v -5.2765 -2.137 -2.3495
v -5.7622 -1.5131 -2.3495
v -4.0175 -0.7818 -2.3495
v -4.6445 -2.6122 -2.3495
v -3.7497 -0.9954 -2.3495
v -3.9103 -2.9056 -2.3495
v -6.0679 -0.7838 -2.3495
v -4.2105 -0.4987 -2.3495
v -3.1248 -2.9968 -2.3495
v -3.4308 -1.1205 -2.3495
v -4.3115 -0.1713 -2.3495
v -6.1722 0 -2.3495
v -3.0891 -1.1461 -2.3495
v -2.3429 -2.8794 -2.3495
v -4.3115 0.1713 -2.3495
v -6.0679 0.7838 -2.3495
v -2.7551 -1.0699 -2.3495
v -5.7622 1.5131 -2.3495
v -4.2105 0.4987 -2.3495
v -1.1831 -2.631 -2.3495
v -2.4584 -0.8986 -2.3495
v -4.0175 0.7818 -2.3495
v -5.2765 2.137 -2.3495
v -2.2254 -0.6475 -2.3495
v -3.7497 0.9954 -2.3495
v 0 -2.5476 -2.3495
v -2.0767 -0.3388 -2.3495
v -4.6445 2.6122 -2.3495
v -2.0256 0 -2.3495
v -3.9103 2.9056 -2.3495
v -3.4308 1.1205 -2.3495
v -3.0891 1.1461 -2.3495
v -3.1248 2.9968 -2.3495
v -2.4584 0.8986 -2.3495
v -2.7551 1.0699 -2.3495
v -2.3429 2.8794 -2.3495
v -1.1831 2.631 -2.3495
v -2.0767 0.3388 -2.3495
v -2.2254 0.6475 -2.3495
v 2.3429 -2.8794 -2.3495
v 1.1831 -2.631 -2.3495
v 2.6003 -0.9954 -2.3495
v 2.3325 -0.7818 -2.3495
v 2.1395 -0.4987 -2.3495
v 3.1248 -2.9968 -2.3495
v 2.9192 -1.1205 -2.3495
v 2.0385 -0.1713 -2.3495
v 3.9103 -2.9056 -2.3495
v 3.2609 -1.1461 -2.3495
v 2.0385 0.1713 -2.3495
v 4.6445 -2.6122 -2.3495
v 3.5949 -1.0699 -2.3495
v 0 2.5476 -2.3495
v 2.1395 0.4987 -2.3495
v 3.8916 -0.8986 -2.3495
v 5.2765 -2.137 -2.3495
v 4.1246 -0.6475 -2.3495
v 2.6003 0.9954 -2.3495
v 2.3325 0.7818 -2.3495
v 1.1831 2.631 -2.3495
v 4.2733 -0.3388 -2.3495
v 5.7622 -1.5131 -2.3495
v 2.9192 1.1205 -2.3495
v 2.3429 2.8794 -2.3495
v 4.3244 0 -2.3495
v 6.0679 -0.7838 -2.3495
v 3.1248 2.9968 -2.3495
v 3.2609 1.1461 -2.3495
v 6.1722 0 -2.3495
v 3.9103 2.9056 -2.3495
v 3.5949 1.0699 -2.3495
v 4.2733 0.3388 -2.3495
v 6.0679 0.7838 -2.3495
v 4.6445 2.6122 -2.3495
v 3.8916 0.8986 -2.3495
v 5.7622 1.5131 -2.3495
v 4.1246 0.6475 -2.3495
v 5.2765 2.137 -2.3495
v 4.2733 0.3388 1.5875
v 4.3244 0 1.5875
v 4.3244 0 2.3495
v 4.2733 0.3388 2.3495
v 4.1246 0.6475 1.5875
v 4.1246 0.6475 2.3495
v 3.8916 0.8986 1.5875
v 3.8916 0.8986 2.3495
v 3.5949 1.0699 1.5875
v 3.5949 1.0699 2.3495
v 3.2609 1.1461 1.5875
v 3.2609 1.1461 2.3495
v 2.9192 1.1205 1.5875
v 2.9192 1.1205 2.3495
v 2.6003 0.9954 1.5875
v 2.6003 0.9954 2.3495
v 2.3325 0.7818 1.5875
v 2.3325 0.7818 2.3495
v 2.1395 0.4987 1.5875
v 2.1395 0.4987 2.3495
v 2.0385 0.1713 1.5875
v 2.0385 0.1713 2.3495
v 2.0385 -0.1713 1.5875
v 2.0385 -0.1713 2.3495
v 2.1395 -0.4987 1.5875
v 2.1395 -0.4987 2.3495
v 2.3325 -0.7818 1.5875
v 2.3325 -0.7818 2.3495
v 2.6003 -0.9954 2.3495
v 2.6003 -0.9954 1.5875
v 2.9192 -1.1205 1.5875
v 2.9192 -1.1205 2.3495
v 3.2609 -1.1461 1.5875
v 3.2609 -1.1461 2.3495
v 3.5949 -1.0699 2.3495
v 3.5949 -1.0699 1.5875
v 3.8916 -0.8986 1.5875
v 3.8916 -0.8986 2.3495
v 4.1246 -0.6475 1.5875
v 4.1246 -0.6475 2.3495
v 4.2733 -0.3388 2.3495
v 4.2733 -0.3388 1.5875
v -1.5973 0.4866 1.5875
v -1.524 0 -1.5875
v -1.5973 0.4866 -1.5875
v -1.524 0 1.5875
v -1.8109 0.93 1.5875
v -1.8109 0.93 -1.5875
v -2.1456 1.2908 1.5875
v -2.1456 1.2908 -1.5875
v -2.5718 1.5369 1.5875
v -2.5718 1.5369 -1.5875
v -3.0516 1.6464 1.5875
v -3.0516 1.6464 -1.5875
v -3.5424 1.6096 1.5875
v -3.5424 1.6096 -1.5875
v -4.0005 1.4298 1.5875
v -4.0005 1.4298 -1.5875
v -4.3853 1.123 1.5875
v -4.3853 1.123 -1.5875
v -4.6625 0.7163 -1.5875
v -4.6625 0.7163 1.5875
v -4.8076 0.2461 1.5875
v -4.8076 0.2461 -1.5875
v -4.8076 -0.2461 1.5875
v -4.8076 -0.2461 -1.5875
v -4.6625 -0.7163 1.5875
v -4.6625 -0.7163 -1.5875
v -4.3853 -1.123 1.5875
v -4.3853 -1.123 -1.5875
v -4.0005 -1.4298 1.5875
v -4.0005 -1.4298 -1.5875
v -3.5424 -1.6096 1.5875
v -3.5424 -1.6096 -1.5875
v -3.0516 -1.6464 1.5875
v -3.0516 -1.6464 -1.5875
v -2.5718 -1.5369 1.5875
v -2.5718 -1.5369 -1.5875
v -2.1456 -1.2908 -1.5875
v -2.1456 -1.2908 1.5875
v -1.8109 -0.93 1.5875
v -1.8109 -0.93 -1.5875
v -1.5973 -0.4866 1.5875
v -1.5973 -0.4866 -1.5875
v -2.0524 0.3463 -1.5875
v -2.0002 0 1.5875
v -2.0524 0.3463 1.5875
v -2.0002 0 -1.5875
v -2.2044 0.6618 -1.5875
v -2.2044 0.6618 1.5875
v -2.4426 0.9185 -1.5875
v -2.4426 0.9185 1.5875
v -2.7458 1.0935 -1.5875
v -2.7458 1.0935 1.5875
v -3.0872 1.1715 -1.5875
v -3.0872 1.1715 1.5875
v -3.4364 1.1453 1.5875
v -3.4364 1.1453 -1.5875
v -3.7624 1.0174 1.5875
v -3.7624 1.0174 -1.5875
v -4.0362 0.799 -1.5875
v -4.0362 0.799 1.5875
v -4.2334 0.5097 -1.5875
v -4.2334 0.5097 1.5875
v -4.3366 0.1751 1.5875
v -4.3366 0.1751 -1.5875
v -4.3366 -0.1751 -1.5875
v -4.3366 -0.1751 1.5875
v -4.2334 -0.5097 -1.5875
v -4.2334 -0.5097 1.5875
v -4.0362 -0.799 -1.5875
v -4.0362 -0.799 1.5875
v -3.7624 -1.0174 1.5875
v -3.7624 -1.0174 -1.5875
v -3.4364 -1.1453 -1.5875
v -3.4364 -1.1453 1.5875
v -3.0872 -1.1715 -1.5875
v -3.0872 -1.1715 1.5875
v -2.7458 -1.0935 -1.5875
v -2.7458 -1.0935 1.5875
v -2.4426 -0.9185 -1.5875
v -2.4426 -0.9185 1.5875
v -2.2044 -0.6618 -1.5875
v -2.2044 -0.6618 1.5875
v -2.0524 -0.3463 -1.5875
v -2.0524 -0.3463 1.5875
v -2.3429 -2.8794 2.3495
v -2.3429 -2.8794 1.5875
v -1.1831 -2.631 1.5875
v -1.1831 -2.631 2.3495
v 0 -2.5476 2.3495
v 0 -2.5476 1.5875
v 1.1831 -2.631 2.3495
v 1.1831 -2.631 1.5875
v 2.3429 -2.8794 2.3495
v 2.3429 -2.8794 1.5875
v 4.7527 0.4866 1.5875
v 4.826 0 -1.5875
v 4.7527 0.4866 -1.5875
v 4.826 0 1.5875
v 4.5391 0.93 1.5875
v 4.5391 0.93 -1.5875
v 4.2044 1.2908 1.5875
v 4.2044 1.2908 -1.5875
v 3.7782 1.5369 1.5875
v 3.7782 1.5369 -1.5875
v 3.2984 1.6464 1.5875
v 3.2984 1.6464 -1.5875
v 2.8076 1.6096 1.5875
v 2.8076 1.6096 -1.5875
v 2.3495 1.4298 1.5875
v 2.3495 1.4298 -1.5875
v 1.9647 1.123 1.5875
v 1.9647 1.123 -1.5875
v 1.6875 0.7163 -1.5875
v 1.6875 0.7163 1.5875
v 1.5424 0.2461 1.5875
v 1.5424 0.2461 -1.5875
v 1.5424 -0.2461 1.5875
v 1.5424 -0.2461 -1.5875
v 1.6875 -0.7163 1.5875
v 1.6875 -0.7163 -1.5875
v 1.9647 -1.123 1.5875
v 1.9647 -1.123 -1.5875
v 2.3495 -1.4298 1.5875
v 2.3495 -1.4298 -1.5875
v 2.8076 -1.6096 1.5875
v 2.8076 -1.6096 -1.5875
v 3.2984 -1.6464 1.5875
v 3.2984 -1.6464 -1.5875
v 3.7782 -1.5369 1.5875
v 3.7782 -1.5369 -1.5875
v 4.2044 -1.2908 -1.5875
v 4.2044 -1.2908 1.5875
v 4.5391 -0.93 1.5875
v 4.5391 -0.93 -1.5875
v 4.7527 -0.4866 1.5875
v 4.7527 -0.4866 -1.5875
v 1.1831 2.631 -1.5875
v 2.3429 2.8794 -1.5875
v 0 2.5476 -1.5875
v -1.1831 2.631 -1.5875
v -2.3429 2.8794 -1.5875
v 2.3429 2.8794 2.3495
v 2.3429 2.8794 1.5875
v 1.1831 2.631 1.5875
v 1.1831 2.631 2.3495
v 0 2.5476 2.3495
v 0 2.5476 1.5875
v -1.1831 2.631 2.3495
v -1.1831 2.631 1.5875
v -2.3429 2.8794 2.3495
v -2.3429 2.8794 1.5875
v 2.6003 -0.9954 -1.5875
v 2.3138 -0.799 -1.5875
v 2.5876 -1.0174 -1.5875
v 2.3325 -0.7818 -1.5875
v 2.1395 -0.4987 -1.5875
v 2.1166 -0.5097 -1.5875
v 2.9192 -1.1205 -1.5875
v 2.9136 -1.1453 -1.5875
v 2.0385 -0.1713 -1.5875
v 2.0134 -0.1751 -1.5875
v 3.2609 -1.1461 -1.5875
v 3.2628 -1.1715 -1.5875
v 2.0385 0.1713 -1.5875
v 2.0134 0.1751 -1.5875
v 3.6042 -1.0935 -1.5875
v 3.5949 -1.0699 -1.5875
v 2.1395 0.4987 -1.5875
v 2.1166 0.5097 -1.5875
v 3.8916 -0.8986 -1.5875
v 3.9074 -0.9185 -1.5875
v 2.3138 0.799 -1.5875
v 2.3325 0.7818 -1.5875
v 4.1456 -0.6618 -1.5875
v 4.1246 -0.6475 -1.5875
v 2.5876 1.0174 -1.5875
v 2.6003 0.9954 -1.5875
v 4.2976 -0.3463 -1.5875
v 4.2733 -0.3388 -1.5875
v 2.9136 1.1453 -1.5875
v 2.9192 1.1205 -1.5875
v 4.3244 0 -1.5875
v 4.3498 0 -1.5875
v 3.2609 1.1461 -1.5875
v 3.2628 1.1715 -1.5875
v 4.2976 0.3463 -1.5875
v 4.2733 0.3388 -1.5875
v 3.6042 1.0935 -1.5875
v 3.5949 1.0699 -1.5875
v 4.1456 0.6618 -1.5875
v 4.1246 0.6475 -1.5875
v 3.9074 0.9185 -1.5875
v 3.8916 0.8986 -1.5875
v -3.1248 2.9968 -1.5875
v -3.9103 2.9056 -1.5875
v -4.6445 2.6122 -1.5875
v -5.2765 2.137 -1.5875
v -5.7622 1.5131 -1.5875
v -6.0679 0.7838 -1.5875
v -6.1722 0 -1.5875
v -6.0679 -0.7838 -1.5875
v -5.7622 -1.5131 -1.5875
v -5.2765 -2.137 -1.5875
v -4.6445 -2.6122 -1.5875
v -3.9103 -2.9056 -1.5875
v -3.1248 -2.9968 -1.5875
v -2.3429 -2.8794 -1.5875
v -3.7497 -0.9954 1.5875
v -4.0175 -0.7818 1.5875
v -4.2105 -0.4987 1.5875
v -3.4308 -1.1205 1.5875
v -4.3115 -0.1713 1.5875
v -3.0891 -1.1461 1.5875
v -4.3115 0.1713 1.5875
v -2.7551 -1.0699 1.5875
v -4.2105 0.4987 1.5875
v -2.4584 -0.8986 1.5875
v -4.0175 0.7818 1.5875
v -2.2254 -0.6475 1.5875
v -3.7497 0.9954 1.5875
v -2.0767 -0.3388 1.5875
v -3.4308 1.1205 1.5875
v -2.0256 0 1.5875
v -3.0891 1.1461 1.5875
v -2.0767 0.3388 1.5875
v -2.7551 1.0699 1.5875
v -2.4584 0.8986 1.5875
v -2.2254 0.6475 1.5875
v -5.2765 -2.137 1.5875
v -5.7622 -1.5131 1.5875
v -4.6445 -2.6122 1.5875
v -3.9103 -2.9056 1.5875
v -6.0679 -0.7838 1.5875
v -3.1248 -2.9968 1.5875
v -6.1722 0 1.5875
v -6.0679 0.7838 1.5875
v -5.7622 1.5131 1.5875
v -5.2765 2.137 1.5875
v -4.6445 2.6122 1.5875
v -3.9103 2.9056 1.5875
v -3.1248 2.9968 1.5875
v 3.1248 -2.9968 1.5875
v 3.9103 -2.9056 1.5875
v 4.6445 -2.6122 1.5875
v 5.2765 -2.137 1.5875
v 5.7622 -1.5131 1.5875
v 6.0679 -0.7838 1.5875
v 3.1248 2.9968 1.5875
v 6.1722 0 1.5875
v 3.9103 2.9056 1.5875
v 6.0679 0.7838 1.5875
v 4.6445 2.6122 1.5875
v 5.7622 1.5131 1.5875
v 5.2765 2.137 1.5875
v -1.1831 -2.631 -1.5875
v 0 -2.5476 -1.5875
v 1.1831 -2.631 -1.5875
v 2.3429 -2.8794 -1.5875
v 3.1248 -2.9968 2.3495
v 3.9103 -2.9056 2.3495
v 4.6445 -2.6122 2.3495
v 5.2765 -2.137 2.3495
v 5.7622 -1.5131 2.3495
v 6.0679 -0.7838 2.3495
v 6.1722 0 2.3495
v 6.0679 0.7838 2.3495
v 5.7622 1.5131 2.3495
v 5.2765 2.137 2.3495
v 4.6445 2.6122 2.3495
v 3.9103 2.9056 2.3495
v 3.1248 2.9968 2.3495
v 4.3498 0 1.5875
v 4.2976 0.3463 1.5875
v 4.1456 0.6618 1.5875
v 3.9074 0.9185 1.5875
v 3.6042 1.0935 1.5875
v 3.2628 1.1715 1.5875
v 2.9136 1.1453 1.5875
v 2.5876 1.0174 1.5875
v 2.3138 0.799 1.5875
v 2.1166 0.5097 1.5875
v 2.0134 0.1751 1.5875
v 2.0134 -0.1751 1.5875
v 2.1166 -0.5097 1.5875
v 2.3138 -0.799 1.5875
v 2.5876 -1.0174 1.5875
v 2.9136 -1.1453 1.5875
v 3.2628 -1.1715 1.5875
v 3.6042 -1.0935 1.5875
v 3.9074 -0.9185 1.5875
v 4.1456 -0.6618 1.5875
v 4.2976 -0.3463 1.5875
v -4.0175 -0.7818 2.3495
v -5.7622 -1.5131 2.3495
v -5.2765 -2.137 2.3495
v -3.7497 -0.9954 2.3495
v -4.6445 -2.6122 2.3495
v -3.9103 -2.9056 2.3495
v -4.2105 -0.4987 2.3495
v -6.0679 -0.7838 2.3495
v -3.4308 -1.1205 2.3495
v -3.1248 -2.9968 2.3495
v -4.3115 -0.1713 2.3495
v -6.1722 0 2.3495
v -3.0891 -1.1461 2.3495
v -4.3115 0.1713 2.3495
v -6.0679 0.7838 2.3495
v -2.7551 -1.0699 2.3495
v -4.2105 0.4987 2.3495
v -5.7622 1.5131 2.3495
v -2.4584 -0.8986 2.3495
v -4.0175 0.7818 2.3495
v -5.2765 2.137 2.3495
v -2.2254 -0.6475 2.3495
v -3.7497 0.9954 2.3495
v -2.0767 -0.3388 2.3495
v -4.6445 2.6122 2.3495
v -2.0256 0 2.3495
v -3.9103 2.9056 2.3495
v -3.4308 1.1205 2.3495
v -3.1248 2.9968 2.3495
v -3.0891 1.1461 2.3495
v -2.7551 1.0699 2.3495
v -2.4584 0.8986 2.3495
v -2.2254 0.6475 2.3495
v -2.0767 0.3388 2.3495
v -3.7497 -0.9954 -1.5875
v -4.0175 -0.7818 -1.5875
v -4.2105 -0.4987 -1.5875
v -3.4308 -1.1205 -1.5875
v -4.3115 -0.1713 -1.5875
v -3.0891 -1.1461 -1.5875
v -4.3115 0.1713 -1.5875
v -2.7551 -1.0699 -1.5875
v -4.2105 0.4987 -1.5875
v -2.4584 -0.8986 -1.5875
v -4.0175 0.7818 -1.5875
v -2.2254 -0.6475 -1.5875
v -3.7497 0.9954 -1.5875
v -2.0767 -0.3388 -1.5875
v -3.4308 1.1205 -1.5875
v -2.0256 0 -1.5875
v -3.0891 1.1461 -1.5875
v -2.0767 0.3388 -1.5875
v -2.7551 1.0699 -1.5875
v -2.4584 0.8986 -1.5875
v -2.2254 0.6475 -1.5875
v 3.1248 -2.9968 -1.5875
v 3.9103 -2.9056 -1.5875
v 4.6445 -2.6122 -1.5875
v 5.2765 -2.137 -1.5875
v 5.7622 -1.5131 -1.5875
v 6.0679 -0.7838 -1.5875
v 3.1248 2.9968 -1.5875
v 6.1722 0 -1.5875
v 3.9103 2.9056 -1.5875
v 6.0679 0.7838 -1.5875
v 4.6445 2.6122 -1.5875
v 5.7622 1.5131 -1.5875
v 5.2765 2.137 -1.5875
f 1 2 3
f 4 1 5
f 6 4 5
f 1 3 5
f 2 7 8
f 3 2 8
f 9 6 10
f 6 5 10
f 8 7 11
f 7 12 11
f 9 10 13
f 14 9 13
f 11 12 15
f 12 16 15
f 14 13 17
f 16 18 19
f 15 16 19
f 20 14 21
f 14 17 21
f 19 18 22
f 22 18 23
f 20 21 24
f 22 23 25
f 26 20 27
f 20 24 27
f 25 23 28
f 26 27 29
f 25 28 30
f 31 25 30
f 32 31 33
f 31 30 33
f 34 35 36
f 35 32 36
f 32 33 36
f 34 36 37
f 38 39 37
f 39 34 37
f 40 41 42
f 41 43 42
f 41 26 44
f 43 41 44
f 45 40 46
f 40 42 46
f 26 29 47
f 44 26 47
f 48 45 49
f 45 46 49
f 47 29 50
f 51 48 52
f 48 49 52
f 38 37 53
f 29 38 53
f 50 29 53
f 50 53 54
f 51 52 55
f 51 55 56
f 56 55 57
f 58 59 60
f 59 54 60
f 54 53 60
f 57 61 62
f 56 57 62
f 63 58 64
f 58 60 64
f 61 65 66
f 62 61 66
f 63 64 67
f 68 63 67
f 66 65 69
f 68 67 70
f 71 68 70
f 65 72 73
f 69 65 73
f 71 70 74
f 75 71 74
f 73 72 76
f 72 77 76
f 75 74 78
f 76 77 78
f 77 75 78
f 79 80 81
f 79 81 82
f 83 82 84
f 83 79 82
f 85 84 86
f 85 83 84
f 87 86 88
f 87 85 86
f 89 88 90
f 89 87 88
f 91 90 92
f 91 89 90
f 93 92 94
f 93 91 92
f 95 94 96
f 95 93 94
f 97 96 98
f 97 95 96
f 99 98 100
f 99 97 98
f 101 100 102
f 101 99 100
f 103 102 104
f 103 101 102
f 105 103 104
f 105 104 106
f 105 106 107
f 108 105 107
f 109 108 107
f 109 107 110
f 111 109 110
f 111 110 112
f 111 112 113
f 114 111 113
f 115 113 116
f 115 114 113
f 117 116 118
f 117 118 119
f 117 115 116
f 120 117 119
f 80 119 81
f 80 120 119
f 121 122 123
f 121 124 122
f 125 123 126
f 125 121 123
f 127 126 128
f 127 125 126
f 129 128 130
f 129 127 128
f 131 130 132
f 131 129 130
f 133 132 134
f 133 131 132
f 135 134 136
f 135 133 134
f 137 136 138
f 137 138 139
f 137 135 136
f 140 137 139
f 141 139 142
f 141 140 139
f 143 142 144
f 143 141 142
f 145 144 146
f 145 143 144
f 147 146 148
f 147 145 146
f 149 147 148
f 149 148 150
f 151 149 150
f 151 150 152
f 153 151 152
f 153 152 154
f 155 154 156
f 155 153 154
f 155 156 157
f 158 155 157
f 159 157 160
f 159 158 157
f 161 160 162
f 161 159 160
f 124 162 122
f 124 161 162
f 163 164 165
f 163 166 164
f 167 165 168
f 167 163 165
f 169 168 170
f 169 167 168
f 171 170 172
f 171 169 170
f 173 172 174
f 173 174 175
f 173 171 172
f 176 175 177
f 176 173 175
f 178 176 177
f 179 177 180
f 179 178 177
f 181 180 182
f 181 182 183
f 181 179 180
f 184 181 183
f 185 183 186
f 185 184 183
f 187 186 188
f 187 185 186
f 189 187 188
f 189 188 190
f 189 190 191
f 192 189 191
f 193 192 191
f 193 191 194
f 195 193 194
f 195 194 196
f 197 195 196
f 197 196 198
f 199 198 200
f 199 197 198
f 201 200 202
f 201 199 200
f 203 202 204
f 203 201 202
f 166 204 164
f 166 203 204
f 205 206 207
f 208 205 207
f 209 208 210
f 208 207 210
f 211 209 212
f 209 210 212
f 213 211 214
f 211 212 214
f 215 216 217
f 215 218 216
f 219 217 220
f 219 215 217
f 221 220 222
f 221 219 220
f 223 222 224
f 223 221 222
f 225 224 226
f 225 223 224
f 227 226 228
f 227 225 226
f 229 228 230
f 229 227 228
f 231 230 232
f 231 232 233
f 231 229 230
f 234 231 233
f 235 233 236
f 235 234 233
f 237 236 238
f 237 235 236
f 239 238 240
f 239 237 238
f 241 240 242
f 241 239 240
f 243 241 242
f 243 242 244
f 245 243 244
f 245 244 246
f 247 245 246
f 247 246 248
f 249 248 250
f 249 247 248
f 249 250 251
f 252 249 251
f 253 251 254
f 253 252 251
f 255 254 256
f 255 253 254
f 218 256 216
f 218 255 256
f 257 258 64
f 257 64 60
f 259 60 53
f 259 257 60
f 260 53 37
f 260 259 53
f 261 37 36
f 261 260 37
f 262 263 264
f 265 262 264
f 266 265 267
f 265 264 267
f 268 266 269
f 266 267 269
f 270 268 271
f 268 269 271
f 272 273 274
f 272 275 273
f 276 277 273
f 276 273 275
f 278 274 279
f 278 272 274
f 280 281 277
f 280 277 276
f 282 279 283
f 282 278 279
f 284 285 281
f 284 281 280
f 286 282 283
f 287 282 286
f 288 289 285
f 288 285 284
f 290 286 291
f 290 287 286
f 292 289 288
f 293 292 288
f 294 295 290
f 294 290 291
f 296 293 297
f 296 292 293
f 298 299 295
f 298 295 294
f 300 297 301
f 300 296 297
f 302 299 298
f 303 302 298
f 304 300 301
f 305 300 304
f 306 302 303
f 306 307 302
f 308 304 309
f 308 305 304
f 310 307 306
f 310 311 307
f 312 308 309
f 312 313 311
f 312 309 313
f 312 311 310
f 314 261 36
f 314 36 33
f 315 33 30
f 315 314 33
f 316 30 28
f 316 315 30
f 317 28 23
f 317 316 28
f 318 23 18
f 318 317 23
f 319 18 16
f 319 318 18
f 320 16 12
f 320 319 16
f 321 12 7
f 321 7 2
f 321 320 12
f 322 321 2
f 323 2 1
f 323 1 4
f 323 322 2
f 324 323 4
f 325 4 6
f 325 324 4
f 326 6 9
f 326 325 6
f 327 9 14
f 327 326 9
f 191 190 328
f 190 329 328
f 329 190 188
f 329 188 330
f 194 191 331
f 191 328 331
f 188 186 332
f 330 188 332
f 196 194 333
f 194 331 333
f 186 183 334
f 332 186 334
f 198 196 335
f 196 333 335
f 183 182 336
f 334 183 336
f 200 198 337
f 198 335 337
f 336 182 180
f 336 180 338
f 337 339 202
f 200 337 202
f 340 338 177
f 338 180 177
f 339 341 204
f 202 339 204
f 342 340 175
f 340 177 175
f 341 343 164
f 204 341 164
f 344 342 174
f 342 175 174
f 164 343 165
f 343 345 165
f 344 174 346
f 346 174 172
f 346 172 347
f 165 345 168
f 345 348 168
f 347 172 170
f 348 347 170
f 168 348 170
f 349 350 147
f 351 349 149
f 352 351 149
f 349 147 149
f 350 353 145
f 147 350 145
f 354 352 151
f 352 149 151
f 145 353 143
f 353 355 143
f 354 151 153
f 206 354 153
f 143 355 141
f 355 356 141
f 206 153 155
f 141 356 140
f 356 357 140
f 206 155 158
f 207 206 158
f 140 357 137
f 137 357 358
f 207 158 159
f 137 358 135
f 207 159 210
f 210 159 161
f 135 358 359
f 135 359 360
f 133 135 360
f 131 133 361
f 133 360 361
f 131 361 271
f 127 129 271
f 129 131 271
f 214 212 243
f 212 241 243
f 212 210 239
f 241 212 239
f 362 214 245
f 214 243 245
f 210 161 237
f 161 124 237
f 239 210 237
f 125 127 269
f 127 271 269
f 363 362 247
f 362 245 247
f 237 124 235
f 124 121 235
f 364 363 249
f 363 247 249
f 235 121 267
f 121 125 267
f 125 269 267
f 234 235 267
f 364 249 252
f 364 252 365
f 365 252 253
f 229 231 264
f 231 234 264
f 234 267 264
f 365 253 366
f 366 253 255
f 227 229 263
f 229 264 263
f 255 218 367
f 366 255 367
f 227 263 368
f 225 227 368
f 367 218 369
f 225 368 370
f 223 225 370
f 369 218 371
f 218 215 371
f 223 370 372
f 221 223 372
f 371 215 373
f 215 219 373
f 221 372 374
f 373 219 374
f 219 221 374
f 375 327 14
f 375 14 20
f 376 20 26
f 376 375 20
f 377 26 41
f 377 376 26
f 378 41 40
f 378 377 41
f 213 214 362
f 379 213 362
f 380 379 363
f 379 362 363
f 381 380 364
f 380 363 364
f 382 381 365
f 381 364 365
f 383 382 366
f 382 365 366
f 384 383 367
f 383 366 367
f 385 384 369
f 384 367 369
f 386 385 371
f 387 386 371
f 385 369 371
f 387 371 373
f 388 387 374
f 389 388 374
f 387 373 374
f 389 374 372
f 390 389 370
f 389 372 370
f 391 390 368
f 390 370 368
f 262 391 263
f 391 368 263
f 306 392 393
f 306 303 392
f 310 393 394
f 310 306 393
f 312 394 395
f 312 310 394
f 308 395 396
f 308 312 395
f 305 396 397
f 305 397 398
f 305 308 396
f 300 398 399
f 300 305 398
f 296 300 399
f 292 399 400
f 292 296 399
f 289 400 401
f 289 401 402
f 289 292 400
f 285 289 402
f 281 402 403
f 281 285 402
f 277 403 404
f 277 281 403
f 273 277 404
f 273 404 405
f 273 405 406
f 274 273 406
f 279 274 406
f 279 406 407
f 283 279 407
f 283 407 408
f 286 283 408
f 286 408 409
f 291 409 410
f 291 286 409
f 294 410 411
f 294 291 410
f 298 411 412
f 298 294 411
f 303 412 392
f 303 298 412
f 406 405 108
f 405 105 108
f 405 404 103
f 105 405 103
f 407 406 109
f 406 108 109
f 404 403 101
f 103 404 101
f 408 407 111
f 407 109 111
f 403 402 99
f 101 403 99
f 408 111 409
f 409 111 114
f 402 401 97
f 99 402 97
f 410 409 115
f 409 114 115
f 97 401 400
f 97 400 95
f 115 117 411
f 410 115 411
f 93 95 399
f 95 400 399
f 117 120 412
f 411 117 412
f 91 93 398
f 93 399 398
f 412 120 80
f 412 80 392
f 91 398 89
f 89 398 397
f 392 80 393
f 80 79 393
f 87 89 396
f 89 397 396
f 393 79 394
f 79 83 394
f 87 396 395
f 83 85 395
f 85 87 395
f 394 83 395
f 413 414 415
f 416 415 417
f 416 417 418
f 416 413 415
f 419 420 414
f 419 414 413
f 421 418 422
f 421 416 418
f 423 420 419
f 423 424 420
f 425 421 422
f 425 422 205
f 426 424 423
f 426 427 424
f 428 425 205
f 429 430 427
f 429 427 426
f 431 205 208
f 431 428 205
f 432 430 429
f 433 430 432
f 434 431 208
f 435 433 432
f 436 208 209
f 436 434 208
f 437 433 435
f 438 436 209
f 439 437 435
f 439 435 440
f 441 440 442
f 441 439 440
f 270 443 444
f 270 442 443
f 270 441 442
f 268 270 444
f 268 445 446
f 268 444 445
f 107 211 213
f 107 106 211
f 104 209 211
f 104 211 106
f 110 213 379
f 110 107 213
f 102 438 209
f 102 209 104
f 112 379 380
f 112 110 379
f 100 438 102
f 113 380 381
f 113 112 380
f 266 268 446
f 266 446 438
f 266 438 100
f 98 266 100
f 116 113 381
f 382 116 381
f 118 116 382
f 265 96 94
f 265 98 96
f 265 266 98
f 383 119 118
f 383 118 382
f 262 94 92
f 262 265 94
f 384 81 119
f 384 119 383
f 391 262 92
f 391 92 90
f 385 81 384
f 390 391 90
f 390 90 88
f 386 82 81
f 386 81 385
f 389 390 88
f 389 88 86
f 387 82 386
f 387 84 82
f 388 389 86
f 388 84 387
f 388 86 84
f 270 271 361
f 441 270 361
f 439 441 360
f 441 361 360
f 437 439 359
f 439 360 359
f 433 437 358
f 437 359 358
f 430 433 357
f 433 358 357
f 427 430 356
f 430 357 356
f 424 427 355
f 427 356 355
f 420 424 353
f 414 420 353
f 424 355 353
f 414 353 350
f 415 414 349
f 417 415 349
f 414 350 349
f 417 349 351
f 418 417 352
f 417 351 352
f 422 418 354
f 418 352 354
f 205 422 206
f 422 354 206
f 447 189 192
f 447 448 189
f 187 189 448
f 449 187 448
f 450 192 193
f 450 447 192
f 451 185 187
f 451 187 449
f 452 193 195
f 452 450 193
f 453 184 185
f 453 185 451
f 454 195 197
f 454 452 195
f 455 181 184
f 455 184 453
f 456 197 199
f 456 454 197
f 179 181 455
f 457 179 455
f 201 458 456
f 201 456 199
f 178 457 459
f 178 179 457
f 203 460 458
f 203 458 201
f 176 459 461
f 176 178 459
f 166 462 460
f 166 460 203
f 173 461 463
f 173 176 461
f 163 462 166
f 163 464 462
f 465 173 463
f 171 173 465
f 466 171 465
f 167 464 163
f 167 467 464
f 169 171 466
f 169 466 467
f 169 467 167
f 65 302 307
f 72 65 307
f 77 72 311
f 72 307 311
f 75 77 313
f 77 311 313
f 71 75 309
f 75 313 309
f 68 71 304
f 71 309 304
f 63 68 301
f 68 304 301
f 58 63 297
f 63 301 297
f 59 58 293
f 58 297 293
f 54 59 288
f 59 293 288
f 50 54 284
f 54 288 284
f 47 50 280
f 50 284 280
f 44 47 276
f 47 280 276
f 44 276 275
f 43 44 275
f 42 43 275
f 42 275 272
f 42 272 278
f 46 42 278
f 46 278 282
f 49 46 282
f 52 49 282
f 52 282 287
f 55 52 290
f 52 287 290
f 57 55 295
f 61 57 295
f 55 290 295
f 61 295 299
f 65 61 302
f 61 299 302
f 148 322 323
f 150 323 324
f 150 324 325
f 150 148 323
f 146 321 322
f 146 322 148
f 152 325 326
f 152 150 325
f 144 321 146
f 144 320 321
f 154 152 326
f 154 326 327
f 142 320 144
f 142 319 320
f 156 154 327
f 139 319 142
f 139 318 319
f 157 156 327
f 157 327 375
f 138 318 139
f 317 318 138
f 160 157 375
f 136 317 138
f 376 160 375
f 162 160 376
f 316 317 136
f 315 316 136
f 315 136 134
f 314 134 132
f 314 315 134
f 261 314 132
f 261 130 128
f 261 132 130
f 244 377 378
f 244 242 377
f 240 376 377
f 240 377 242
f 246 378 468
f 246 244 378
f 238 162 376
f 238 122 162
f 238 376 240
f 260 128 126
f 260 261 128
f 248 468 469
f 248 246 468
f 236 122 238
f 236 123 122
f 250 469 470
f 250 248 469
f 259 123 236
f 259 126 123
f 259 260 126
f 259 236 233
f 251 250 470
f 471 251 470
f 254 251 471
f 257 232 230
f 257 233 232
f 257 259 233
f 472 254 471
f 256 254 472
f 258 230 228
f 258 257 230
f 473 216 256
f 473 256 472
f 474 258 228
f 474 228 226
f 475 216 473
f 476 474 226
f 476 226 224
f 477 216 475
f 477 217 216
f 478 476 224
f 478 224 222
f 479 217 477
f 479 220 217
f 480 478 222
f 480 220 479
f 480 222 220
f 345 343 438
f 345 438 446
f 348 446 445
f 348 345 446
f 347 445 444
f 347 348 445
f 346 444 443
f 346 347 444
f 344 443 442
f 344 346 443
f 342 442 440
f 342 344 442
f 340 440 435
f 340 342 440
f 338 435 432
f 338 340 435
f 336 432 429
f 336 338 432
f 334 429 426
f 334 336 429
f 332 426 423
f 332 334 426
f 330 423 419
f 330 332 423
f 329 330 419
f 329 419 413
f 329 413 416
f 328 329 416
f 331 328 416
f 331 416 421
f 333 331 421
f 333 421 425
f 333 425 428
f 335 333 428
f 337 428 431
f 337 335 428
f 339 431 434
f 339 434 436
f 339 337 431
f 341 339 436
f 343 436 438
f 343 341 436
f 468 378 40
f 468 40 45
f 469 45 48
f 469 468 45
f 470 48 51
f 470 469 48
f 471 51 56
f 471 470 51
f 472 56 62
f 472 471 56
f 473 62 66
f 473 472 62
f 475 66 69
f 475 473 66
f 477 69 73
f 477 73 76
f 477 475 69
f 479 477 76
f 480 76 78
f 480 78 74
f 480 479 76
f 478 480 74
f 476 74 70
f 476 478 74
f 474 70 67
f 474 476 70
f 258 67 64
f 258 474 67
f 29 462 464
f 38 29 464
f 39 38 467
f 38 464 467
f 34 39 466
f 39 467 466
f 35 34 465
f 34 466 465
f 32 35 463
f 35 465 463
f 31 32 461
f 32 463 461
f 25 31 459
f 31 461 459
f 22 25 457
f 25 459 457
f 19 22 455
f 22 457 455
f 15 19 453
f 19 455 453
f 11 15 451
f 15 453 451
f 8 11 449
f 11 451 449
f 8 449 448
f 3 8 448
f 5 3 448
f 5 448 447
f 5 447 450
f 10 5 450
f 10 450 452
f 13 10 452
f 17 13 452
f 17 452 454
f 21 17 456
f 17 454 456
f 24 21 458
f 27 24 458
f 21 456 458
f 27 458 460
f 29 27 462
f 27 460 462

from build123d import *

# Parameters (mm, degrees)
SKETCH4_R             = 1.651
SKETCH4_R_2           = 1.17475
BOSS_EXTRUDE1_DEPTH   = 1.5875
BOSS_EXTRUDE1_2_DEPTH = 1.5875
SKETCH5_R             = 1.14935
BOSS_EXTRUDE2_DEPTH   = 0.762


with BuildPart() as part:
    # Sketch4 → Boss-Extrude1 (new, symmetric)
    with BuildSketch(Plane.XY):
        with Locations((-3.175, 0)):
            Circle(SKETCH4_R)
        with Locations((-3.175, 0)):
            Circle(SKETCH4_R_2, mode=Mode.SUBTRACT)
    extrude(amount=BOSS_EXTRUDE1_DEPTH, both=True)


with BuildPart() as body_2:
    # Sketch4 → Boss-Extrude1 2 (new, symmetric)
    with BuildSketch(Plane.XY):
        with Locations((3.175, 0)):
            Circle(SKETCH4_R)
        with Locations((3.175, 0)):
            Circle(SKETCH4_R_2, mode=Mode.SUBTRACT)
    extrude(amount=BOSS_EXTRUDE1_2_DEPTH, both=True)


with BuildPart() as body_3:
    # Sketch5 → Boss-Extrude2 (new body)
    with BuildSketch(Plane.XY.offset(1.5875)):
        with BuildLine():
            ThreePointArc((-2.342877482, 2.879371452), (-6.1722, 0), (-2.342877482, -2.879371452))
            ThreePointArc((-2.342877482, -2.879371452), (0, -2.54762), (2.342877482, -2.879371452))
            ThreePointArc((2.342877482, -2.879371452), (6.1722, 0), (2.342877482, 2.879371452))
            ThreePointArc((2.342877482, 2.879371452), (0, 2.54762), (-2.342877482, 2.879371452))
        make_face()
        with Locations((-3.175, 0)):
            Circle(SKETCH5_R, mode=Mode.SUBTRACT)
        with Locations((3.175, 0)):
            Circle(SKETCH5_R, mode=Mode.SUBTRACT)
    extrude(amount=BOSS_EXTRUDE2_DEPTH)


with BuildPart() as body_4:
    # Mirror3: mirrored copy
    add(body_3.part.mirror(Plane.XY))

    # Combine2: union body 3, body 2, part
    add(body_3.part)
    add(body_2.part)
    add(part.part)


solid = body_4.part
